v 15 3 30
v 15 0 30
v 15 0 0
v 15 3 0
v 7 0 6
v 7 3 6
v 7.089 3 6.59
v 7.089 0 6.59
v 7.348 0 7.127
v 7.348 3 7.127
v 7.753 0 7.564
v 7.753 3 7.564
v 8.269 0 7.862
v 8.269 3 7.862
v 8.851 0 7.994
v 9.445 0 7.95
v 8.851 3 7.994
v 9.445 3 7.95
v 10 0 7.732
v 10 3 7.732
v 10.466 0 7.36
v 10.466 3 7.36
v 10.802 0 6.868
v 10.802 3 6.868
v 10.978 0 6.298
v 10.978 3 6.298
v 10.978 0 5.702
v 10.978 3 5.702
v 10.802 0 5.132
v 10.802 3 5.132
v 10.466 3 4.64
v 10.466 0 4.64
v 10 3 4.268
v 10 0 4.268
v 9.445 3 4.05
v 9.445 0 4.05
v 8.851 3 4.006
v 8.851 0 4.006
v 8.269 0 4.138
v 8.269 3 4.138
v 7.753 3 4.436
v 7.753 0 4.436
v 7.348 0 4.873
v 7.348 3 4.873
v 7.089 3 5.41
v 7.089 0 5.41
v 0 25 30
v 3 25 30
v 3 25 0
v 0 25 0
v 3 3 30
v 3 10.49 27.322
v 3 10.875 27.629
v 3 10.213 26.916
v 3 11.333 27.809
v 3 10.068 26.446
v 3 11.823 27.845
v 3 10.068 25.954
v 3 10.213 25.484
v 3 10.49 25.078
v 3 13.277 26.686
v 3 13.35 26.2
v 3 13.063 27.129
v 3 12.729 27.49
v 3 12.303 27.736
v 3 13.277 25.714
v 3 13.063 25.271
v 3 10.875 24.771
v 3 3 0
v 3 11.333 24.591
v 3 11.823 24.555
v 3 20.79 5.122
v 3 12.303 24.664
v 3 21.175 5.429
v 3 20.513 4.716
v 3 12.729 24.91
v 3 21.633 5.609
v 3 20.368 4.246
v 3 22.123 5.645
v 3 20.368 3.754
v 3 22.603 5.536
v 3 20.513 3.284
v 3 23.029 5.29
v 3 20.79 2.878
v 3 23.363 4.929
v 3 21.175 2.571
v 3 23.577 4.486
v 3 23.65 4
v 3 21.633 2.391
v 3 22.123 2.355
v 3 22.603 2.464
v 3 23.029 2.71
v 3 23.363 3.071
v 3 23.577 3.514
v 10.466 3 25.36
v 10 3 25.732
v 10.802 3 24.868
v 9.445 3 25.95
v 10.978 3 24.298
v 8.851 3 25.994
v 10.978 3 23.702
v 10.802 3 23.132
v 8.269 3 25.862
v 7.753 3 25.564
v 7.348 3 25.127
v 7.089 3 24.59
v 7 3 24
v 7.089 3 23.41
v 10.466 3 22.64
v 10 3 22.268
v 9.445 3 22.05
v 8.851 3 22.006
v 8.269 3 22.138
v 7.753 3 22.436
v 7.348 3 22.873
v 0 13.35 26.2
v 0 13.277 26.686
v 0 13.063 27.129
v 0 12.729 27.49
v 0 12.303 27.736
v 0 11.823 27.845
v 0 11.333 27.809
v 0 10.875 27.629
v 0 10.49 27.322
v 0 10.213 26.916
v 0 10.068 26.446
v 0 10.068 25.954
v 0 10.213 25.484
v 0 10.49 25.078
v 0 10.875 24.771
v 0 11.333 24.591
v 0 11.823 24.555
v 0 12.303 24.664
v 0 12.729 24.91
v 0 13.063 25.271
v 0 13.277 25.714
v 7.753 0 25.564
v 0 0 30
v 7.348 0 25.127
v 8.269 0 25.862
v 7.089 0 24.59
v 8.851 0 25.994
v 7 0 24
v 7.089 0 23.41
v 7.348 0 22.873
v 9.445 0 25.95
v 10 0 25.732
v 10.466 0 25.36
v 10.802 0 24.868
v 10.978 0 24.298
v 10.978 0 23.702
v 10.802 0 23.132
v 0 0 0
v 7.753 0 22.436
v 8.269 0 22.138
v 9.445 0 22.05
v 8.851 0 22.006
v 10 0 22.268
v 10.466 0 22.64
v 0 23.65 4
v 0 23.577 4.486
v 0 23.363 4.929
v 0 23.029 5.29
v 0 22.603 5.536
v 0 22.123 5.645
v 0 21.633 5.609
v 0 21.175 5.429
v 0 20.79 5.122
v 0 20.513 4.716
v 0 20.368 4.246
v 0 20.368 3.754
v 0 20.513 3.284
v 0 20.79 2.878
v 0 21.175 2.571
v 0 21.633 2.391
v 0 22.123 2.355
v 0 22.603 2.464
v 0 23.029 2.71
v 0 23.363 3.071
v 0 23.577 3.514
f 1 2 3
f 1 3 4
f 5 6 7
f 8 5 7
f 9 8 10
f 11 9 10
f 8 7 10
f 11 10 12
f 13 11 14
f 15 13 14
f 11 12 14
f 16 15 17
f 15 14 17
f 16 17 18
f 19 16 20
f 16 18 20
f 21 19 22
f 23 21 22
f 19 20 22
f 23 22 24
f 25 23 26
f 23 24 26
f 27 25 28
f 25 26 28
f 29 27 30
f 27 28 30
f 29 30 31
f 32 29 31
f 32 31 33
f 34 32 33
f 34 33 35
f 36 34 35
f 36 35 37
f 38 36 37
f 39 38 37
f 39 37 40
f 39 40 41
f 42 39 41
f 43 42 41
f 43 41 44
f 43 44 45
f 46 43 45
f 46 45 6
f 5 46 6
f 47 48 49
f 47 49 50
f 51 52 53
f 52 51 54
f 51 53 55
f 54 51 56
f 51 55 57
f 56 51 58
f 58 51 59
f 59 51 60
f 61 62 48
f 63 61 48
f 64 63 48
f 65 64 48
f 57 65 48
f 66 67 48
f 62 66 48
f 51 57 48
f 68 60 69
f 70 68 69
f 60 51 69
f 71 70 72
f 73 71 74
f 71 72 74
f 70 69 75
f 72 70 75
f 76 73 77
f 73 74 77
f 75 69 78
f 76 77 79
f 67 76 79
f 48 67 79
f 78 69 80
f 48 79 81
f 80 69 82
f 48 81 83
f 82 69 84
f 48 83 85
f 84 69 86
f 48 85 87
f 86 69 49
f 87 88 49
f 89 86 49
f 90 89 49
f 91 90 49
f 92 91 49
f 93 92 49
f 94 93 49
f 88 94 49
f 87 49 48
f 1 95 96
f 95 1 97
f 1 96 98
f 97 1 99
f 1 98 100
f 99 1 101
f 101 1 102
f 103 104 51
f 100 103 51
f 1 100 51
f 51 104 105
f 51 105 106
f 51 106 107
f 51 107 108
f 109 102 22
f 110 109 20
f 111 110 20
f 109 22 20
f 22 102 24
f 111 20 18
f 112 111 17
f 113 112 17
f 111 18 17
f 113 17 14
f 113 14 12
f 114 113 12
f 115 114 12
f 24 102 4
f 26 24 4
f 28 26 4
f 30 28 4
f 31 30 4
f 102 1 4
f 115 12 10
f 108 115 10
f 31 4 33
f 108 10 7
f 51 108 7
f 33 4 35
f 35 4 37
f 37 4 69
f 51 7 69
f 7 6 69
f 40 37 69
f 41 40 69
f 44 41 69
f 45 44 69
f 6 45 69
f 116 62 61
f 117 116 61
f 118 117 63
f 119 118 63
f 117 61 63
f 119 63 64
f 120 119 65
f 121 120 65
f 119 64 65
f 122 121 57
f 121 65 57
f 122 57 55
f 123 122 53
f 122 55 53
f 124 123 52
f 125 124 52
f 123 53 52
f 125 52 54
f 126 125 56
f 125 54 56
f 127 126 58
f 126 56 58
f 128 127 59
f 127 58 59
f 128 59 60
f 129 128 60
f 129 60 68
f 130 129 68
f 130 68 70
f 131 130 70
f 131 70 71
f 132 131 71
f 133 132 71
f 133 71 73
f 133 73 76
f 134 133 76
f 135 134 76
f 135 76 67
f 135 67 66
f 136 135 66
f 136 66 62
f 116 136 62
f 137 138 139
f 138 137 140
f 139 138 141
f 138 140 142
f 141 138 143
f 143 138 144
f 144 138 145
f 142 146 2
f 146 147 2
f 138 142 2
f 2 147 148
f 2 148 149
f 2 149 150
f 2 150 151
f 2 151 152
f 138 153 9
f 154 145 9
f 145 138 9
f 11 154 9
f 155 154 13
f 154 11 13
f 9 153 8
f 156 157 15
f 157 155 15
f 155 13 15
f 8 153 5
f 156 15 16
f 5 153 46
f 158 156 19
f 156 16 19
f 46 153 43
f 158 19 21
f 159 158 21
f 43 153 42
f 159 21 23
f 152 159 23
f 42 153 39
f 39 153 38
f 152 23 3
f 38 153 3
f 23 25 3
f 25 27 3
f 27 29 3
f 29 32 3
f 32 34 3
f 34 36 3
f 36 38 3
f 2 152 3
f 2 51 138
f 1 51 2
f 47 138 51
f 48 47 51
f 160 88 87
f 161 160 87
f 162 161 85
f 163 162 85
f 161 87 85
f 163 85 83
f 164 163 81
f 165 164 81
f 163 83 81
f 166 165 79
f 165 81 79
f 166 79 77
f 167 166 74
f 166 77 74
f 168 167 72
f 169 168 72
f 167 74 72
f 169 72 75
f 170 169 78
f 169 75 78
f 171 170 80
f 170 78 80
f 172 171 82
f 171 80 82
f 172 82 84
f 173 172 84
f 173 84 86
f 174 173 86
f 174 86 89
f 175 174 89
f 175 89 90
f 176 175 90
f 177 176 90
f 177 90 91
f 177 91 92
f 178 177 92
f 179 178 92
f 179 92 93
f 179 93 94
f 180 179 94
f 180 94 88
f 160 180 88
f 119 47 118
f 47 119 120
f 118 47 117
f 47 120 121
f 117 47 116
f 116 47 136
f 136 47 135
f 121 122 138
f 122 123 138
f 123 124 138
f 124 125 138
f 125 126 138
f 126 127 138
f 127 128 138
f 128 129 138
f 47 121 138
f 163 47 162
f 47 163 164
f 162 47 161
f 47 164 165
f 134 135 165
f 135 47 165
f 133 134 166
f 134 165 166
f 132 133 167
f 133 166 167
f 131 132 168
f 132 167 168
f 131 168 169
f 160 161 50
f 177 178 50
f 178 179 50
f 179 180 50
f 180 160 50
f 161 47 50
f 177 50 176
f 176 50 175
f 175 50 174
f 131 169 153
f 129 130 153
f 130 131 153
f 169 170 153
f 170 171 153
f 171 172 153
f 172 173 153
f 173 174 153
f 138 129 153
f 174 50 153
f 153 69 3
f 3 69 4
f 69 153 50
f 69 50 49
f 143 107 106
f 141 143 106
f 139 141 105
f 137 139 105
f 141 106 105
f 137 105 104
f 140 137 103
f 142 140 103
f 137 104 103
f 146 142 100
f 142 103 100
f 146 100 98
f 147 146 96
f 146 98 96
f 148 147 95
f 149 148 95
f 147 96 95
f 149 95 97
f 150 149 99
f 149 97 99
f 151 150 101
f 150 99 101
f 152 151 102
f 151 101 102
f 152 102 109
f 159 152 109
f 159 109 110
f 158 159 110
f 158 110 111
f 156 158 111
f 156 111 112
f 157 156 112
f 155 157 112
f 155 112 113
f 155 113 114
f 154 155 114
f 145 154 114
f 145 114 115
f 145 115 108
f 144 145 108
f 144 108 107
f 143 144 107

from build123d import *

# Parameters (mm, degrees)
F1_DEPTH = 30
F2_R     = 1.65
F3_DEPTH = 3.001
F4_R     = 2
F5_DEPTH = 3.001


with BuildPart() as f1:
    # F0 (on Top) → F1 (new body)
    with BuildSketch(Plane.XY):
        Polygon((0, 25), (0, 0), (15, 0), (15, 3), (3, 3), (3, 25), align=None)
    extrude(amount=F1_DEPTH)

    # F2 (on face) → F3 (cut, through all)
    with BuildSketch(Plane.YZ.offset(3)):
        with Locations((22, 4)):
            Circle(F2_R)
        with Locations((11.7, 26.2)):
            Circle(F2_R)
    extrude(amount=-F3_DEPTH, mode=Mode.SUBTRACT)

    # F4 (on face) → F5 (cut, through all)
    with BuildSketch(Plane(origin=(0, 3, 0), x_dir=(-1, 0, 0), z_dir=(0, 1, 0))):
        with Locations((-9, 24)):
            Circle(F4_R)
        with Locations((-9, 6)):
            Circle(F4_R)
    extrude(amount=-F5_DEPTH, mode=Mode.SUBTRACT)


solid = f1.part
